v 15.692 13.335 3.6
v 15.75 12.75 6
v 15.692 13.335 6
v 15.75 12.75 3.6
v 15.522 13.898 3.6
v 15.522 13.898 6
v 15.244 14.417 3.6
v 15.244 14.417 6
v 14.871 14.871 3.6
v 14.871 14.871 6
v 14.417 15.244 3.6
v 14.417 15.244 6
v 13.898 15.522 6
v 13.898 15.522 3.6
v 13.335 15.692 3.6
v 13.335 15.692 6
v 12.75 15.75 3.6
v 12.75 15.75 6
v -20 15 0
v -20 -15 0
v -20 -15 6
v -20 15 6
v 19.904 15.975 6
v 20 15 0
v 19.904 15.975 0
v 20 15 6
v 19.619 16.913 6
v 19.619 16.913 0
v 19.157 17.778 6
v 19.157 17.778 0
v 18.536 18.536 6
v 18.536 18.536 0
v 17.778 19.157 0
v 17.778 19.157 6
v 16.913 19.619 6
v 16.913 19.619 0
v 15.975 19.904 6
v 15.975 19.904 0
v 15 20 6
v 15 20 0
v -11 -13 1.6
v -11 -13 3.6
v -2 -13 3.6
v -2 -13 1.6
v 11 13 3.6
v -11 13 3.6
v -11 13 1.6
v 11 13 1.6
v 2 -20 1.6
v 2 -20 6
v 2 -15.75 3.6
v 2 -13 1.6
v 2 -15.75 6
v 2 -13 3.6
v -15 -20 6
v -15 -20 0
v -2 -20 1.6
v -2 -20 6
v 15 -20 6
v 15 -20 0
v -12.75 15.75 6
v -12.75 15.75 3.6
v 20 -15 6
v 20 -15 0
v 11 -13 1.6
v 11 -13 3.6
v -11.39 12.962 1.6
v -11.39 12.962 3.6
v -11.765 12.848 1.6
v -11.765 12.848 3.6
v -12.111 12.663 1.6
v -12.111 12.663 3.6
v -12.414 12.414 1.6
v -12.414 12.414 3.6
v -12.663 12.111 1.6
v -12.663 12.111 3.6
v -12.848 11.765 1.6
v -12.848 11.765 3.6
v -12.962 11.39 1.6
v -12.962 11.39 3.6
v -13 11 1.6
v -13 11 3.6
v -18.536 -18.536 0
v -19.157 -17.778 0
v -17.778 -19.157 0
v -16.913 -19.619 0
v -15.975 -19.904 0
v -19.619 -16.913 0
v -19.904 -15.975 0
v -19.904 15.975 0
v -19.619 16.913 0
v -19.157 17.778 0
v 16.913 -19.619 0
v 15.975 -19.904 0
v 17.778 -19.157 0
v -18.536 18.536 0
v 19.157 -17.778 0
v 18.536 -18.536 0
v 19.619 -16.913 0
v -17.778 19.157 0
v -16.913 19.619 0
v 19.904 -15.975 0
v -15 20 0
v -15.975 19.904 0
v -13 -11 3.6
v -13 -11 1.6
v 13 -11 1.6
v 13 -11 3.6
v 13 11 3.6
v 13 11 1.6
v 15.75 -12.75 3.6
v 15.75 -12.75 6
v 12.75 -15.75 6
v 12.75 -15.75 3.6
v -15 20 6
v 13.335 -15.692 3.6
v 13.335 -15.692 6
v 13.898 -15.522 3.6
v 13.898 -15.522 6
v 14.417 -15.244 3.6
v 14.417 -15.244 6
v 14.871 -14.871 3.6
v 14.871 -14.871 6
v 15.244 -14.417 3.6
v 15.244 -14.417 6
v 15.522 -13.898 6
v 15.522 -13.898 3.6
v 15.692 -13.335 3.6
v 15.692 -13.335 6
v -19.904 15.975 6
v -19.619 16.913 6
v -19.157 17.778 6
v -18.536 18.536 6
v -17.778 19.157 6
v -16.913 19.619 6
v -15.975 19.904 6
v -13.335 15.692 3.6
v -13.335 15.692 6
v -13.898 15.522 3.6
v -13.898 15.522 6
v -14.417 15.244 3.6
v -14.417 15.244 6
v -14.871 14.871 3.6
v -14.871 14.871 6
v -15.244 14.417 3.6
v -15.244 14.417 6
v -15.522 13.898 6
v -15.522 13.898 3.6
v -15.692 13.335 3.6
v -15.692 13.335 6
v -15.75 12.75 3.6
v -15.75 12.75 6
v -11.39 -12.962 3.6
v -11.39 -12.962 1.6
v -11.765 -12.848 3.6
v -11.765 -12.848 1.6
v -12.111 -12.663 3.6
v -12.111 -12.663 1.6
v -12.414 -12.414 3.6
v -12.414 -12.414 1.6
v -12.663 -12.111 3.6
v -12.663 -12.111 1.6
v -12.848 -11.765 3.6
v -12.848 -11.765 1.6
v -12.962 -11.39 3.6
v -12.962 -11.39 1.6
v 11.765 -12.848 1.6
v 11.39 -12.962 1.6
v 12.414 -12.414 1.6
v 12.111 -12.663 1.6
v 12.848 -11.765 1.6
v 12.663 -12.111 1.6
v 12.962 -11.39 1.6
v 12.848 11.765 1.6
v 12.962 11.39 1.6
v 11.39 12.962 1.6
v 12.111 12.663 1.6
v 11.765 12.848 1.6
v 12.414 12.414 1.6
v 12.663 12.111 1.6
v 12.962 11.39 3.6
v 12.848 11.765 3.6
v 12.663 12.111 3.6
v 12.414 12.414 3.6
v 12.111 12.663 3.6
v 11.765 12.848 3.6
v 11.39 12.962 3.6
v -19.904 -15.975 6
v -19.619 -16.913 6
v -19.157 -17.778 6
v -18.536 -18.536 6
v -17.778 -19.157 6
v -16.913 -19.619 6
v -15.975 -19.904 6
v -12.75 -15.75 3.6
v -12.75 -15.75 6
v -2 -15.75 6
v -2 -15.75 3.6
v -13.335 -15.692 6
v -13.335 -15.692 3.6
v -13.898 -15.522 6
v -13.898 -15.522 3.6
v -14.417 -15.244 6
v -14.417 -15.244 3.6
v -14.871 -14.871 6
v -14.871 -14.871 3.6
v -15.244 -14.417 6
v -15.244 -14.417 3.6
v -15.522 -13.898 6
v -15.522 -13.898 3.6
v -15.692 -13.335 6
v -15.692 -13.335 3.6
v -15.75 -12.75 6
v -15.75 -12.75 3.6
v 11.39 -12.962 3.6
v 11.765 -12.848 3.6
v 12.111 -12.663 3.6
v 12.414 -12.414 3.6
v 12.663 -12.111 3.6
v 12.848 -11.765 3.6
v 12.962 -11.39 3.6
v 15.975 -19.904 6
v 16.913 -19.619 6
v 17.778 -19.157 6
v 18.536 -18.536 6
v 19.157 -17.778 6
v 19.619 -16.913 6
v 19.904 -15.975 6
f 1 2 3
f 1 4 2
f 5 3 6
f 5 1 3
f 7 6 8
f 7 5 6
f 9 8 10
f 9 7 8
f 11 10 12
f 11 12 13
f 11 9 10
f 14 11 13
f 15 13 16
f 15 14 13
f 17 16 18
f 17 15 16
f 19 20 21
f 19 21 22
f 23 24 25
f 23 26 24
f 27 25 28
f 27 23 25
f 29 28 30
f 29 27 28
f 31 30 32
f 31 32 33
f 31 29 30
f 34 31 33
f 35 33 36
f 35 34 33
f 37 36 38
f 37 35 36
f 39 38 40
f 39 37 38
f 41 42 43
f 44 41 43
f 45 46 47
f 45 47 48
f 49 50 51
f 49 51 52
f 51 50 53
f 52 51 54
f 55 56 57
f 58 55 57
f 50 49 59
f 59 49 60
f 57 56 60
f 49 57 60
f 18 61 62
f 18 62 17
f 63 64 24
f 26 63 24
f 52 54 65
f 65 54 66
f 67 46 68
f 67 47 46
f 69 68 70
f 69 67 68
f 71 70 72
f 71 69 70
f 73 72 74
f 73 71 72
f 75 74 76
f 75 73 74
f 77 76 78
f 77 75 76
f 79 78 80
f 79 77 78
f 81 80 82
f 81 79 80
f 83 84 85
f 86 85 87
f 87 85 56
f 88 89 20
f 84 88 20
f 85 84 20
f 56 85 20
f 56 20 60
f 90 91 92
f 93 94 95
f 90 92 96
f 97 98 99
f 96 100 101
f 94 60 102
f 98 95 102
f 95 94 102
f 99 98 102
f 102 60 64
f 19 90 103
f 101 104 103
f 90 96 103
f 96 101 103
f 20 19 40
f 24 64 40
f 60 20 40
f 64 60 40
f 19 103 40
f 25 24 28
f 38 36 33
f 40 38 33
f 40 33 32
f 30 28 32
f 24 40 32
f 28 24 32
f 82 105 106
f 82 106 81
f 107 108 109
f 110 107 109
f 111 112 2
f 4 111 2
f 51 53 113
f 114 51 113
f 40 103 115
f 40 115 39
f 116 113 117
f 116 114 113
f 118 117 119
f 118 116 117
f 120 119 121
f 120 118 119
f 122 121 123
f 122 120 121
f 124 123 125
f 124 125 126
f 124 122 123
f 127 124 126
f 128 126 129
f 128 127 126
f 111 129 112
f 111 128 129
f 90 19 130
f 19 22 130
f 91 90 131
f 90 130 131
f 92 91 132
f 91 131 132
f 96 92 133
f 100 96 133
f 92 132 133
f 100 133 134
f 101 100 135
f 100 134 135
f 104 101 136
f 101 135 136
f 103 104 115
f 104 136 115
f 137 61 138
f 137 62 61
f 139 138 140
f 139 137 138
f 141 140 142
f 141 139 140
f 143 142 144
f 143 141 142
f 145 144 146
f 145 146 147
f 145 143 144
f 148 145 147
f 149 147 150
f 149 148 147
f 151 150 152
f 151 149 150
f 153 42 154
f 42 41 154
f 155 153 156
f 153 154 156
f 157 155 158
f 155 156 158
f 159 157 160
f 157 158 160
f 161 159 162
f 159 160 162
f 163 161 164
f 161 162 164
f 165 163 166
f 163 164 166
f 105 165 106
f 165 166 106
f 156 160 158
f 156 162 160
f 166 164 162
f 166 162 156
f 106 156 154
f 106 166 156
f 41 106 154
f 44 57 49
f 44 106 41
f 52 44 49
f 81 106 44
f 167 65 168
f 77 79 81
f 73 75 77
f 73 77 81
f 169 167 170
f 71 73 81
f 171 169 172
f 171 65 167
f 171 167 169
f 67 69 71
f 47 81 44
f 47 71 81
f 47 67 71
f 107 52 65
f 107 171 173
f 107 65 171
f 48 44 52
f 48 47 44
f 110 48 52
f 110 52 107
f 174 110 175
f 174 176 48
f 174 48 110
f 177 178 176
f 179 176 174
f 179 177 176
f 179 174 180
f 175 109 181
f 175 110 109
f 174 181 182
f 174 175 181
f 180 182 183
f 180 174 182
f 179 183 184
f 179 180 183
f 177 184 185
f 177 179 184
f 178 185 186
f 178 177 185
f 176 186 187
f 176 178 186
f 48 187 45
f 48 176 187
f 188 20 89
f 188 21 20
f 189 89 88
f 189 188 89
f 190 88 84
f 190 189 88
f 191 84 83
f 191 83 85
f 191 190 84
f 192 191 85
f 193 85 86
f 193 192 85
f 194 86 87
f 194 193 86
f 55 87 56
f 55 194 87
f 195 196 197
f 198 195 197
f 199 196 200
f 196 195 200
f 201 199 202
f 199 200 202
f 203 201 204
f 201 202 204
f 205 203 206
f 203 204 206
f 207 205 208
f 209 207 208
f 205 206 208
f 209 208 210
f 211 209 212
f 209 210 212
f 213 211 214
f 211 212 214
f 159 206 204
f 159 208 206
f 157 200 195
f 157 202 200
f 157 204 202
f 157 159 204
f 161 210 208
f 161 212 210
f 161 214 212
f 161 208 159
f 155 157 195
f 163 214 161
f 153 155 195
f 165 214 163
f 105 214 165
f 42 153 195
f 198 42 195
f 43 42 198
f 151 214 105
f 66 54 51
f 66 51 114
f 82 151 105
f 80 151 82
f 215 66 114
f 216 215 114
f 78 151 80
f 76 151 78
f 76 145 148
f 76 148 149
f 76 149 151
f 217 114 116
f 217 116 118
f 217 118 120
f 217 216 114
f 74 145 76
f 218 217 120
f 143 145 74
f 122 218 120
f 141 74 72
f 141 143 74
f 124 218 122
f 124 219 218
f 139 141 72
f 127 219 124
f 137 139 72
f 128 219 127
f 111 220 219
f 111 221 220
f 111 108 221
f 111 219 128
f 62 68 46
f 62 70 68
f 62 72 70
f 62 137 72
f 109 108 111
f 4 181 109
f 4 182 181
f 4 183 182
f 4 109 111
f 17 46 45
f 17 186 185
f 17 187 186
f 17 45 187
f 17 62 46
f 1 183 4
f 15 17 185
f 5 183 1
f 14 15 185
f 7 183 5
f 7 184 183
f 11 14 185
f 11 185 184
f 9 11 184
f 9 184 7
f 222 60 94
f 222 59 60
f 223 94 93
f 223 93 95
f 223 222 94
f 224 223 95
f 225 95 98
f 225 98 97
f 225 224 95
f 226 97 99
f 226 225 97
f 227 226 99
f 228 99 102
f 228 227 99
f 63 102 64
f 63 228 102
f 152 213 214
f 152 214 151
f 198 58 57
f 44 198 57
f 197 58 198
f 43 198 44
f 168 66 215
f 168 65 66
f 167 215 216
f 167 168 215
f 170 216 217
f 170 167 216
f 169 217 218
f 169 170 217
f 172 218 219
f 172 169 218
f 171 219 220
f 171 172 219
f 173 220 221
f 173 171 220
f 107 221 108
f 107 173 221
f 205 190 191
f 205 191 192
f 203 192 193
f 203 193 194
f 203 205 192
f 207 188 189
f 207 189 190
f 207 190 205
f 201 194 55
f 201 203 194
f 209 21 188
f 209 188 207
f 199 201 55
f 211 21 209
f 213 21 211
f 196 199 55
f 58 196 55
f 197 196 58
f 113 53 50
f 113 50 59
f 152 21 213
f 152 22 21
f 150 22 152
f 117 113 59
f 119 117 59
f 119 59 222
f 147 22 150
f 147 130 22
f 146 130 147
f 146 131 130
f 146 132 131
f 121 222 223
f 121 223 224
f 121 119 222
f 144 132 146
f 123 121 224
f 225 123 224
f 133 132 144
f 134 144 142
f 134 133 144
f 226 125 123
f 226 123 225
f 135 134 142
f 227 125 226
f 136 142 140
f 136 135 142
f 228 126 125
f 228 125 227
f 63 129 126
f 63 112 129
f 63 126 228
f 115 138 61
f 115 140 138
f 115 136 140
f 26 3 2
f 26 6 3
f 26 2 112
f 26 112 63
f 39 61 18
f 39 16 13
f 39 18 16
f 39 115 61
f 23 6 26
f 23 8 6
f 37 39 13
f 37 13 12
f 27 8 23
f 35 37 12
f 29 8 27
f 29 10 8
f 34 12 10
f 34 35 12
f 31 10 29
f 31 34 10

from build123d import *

# Parameters (mm, degrees)
SKIZZE1_W                       = 40
SKIZZE1_H                       = 40
AUFSATZ_LINEAR_AUSTRAGEN1_DEPTH = 6
VERRUNDUNG1_R                   = 5
SKIZZE2_W                       = 31.5
SKIZZE2_H                       = 31.5
SCHNITT_LINEAR_AUSTRAGEN1_DEPTH = 2.4
VERRUNDUNG2_R                   = 3
SKIZZE3_W                       = 26
SKIZZE3_H                       = 26
SCHNITT_LINEAR_AUSTRAGEN2_DEPTH = 2
VERRUNDUNG3_R                   = 2
SCHNITT_LINEAR_AUSTRAGEN3_REACH = 30.914
SKIZZE4_W                       = 4
SKIZZE4_H                       = 10.038850157


with BuildPart() as part:
    # Skizze1 → Aufsatz-Linear austragen1 (new body)
    with BuildSketch(Plane.XY):
        Rectangle(SKIZZE1_W, SKIZZE1_H)
    extrude(amount=AUFSATZ_LINEAR_AUSTRAGEN1_DEPTH)

    # Verrundung1
    verrundung1_edges = [part.edges().sort_by_distance(p)[0] for p in [
        (-20, 20, 3),
        (20, 20, 3),
        (20, -20, 3),
        (-20, -20, 3),
    ]]
    fillet(verrundung1_edges, radius=VERRUNDUNG1_R)

    # Skizze2 → Schnitt-Linear austragen1 (cut)
    with BuildSketch(Plane.XY.offset(6)):
        Rectangle(SKIZZE2_W, SKIZZE2_H)
    extrude(amount=-SCHNITT_LINEAR_AUSTRAGEN1_DEPTH, mode=Mode.SUBTRACT)

    # Verrundung2
    verrundung2_edges = [part.edges().sort_by_distance(p)[0] for p in [
        (-15.75, -15.75, 4.8),
        (-15.75, 15.75, 4.8),
        (15.75, 15.75, 4.8),
        (15.75, -15.75, 4.8),
    ]]
    fillet(verrundung2_edges, radius=VERRUNDUNG2_R)

    # Skizze3 → Schnitt-Linear austragen2 (cut)
    with BuildSketch(Plane.XY.offset(3.6)):
        Rectangle(SKIZZE3_W, SKIZZE3_H)
    extrude(amount=-SCHNITT_LINEAR_AUSTRAGEN2_DEPTH, mode=Mode.SUBTRACT)

    # Verrundung3
    verrundung3_edges = [part.edges().sort_by_distance(p)[0] for p in [
        (13, 13, 2.6),
        (13, -13, 2.6),
        (-13, -13, 2.6),
        (-13, 13, 2.6),
    ]]
    fillet(verrundung3_edges, radius=VERRUNDUNG3_R)

    # Schnitt-Linear austragen3: up to this face of the body (flat: up to its plane)
    schnitt_linear_austragen3_end = Plane(part.part.faces().sort_by_distance((0, 0, 1.6))[0])
    # Skizze4 → Schnitt-Linear austragen3 (cut, up to the picked face)
    with BuildSketch(Plane.XY.offset(6), mode=Mode.PRIVATE) as schnitt_linear_austragen3_sk1:
        with Locations((0, -17.296929977)):
            Rectangle(SKIZZE4_W, SKIZZE4_H)
    schnitt_linear_austragen3_tool1 = split(extrude(schnitt_linear_austragen3_sk1.sketch, amount=-SCHNITT_LINEAR_AUSTRAGEN3_REACH, mode=Mode.PRIVATE), bisect_by=schnitt_linear_austragen3_end, keep=Keep.BOTH, mode=Mode.PRIVATE)
    add(schnitt_linear_austragen3_tool1.solids().sort_by(Axis((0, -17.29693, 6), (0, 0, -1)))[0], mode=Mode.SUBTRACT)


solid = part.part
